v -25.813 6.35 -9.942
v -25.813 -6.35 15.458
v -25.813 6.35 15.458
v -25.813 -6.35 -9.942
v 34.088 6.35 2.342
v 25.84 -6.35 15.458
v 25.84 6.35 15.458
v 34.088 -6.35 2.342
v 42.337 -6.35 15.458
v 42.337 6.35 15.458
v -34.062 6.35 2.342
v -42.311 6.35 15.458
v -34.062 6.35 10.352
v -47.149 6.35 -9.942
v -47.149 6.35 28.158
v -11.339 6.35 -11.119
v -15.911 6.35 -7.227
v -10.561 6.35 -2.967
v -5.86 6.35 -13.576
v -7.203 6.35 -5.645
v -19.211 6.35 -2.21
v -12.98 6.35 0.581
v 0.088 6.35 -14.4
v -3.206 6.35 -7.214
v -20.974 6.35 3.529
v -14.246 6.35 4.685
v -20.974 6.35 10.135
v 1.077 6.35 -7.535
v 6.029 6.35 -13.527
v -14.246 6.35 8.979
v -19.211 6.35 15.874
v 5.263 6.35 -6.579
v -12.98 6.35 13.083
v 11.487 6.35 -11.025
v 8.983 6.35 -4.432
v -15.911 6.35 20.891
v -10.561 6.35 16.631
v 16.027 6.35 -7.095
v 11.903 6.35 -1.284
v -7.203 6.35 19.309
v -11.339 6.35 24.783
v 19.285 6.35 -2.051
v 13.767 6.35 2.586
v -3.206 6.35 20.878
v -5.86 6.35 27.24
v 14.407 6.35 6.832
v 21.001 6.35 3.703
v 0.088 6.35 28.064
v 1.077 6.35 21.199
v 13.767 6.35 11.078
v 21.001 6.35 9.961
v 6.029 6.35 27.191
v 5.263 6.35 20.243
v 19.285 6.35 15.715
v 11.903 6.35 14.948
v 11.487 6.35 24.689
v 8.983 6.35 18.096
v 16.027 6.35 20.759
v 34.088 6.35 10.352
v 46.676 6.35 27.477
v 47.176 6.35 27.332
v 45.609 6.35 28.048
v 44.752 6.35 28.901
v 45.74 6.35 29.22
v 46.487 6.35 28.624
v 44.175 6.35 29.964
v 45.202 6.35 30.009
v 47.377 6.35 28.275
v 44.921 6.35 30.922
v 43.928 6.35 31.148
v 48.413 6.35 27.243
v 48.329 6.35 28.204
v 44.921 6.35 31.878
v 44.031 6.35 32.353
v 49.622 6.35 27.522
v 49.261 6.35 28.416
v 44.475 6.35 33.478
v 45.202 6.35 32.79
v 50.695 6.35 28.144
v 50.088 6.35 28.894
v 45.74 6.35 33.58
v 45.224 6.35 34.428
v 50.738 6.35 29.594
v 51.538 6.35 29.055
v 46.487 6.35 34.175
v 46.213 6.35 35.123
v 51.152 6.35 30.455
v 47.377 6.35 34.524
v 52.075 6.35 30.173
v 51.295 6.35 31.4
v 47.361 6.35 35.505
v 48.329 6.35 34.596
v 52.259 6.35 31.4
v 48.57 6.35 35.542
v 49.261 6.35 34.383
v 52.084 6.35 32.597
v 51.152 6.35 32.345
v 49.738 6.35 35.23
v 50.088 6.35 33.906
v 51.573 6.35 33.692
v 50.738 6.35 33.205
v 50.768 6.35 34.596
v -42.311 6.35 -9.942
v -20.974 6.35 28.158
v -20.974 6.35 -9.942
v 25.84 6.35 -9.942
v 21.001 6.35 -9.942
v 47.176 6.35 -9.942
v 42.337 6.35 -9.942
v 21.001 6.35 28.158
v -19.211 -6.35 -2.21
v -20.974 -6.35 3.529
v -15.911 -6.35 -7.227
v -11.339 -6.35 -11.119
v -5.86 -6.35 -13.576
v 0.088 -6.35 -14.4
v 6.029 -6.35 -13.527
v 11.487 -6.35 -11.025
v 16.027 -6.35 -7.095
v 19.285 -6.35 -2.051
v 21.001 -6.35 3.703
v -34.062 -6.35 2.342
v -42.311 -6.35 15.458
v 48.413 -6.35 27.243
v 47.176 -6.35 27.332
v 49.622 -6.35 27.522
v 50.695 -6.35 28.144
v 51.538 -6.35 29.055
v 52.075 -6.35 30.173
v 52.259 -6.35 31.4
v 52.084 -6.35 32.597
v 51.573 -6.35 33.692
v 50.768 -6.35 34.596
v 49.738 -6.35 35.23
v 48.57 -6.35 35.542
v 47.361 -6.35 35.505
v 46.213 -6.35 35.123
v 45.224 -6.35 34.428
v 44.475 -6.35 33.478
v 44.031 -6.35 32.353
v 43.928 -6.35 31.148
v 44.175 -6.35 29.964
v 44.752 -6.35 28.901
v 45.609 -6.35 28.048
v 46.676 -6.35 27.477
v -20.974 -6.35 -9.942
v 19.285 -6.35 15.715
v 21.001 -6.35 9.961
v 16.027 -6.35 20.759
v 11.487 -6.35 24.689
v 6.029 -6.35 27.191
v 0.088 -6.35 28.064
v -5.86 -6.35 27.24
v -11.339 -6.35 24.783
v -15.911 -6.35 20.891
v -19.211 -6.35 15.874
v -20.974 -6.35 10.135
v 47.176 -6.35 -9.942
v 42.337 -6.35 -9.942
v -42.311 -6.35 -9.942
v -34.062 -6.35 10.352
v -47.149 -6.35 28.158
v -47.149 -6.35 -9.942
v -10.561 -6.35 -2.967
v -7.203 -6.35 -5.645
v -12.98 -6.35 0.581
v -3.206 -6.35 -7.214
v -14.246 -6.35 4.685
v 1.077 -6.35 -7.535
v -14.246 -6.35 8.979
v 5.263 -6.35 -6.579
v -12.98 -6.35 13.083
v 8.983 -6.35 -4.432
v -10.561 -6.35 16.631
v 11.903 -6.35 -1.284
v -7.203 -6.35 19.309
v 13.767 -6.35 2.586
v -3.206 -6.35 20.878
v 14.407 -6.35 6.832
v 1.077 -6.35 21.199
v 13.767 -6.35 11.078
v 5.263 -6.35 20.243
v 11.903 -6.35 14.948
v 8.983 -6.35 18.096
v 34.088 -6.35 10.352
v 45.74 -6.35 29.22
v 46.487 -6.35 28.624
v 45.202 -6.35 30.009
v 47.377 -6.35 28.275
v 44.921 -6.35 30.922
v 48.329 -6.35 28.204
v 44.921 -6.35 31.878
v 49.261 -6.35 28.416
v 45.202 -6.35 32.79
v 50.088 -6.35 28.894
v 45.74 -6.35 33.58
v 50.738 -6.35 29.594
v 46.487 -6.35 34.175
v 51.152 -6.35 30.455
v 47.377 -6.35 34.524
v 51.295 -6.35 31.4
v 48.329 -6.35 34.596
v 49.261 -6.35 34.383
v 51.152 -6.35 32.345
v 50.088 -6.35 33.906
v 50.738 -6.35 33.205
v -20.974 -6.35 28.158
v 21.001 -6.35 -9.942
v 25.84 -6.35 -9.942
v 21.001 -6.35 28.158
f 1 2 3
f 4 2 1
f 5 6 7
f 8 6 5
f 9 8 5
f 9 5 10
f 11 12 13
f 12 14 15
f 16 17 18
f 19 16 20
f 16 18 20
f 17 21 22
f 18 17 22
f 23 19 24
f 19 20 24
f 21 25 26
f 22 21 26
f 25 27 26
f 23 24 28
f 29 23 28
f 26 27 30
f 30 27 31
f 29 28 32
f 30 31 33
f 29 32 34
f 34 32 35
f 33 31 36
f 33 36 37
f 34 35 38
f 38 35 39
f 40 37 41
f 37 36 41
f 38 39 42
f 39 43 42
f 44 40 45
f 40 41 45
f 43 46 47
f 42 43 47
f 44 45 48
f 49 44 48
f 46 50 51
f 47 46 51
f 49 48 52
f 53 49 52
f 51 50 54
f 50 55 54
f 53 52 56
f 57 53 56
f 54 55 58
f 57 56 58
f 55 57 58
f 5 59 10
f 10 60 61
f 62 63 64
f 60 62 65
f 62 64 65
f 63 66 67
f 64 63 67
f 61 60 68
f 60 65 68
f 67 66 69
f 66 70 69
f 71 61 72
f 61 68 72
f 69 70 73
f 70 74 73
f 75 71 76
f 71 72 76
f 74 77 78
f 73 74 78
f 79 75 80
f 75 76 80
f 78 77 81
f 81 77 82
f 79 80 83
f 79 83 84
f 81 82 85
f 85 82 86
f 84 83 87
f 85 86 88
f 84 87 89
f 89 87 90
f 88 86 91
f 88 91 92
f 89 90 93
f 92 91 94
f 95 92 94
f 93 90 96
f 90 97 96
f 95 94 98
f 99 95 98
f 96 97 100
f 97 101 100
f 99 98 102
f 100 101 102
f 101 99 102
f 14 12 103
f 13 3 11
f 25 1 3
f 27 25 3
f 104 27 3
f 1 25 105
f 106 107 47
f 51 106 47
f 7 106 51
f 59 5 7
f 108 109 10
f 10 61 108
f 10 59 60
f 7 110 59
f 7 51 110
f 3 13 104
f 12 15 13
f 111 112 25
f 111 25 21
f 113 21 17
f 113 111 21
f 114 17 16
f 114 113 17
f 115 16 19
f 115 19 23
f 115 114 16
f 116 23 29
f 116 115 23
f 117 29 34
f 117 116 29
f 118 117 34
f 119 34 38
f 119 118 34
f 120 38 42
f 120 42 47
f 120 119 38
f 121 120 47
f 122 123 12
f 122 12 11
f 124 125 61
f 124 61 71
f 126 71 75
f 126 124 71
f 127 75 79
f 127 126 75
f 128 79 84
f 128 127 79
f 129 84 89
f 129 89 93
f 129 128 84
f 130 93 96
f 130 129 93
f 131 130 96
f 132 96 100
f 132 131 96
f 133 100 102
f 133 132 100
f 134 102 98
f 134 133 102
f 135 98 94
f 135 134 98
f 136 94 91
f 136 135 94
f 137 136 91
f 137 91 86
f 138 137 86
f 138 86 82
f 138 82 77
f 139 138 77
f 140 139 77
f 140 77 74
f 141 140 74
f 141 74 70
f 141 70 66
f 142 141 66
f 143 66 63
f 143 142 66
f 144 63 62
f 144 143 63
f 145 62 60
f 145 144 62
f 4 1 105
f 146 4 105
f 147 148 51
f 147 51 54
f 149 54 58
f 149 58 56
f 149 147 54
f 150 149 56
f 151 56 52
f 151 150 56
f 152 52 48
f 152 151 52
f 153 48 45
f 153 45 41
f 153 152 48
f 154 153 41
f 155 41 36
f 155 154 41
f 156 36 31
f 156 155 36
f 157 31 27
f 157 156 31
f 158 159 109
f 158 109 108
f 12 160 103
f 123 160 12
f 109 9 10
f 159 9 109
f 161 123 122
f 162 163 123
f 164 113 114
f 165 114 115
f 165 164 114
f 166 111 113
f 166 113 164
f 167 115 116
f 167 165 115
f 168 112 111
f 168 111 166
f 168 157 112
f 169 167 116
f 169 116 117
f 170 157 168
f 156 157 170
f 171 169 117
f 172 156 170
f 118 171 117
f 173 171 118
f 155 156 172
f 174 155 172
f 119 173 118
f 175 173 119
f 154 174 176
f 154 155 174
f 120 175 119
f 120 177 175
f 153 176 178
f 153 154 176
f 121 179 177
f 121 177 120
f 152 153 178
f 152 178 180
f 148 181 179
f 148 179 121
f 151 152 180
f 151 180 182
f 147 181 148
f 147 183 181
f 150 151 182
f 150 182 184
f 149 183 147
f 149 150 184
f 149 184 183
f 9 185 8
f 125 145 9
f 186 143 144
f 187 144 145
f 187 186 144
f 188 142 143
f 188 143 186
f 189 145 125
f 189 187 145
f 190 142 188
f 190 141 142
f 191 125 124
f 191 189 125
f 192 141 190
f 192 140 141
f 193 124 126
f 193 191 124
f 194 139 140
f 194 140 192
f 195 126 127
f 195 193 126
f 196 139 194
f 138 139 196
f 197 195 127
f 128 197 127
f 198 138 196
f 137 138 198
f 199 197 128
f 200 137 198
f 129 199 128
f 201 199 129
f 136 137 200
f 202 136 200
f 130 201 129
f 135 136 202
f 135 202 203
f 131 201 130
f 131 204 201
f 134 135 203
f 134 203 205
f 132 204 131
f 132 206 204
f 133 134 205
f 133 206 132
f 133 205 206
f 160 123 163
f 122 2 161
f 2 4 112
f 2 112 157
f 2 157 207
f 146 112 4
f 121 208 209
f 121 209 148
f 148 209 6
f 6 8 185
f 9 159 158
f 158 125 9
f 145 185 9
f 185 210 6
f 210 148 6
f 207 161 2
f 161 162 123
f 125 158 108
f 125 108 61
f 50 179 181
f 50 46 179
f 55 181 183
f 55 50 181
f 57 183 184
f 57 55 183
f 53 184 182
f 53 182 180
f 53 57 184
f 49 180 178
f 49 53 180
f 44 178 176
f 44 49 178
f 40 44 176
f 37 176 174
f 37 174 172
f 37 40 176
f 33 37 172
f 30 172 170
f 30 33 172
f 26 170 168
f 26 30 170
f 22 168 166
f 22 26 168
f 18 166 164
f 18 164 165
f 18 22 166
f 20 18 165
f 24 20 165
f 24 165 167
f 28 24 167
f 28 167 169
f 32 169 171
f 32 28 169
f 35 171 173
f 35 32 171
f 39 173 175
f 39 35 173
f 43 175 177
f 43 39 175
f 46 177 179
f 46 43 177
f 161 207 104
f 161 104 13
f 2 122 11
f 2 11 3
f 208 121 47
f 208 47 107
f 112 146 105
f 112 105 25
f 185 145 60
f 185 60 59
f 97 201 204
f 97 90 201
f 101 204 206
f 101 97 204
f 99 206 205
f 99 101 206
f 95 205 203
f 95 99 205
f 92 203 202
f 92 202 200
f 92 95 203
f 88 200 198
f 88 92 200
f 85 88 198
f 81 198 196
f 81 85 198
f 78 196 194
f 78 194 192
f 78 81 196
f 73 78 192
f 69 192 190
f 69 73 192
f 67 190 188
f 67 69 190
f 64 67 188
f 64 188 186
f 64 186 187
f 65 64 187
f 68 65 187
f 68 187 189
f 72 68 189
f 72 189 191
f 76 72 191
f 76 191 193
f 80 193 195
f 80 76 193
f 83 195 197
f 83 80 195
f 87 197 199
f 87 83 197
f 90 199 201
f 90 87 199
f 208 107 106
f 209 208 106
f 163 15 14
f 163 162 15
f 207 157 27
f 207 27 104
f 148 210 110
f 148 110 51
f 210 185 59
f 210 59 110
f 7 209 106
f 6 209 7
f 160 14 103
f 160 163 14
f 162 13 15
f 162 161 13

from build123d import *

# Parameters (mm, degrees)
F0_R     = 14.4068230009
F0_R_2   = 3.2049597944
F1_DEPTH = 6.35


with BuildPart() as f1:
    # F0 (on Front) → F1 (new body, symmetric)
    with BuildSketch(Plane.XZ):
        with BuildLine():
            Line((-47.1492125925, -9.9419855554), (-42.3105131817, -9.9419855554))
            Line((-42.3105131817, -9.9419855554), (-42.3105131817, 15.4580144446))
            Line((-42.3105131817, 15.4580144446), (-34.0617353508, 2.3423101061))
            Line((-34.0617353508, 2.3423101061), (-25.8129575198, 15.4580144446))
            Line((-25.8129575198, 15.4580144446), (-25.8129575198, -9.9419855554))
            Line((-25.8129575198, -9.9419855554), (-20.974258109, -9.9419855554))
            Line((-20.974258109, -9.9419855554), (-20.974258109, 3.529483276))
            ThreePointArc((-20.974258109, 3.529483276), (-21.2326654511, 6.8319942802), (-20.974258109, 10.1345052844))
            Line((-20.974258109, 10.1345052844), (-20.974258109, 28.1580144446))
            Line((-20.974258109, 28.1580144446), (-34.0617353508, 10.3524101739))
            Line((-34.0617353508, 10.3524101739), (-47.1492125925, 28.1580144446))
            Line((-47.1492125925, 28.1580144446), (-47.1492125925, -9.9419855554))
        make_face()
        with BuildLine():
            ThreePointArc((21.0008528084, 9.9609339535), (0.0877984695, 28.0644782043), (-20.974258109, 10.1345052844))
            Line((-20.974258109, 10.1345052844), (-20.974258109, 3.529483276))
            ThreePointArc((-20.974258109, 3.529483276), (0.0877984695, -14.4004896439), (21.0008528084, 3.703054607))
            Line((21.0008528084, 3.703054607), (21.0008528084, 9.9609339535))
        make_face()
        with Locations((0, 6.8319942802)):
            Circle(F0_R, mode=Mode.SUBTRACT)
        with BuildLine():
            Line((-20.974258109, 3.529483276), (-20.974258109, 10.1345052844))
            ThreePointArc((-20.974258109, 10.1345052844), (-21.2326654511, 6.8319942802), (-20.974258109, 3.529483276))
        make_face()
        with BuildLine():
            Line((21.0008528084, 28.1580144446), (21.0008528084, 9.9609339535))
            ThreePointArc((21.0008528084, 9.9609339535), (21.1746329841, 8.4007517966), (21.2326654511, 6.8319942802))
            ThreePointArc((21.2326654511, 6.8319942802), (21.1746329841, 5.2632367639), (21.0008528084, 3.703054607))
            Line((21.0008528084, 3.703054607), (21.0008528084, -9.9419855554))
            Line((21.0008528084, -9.9419855554), (25.8395522192, -9.9419855554))
            Line((25.8395522192, -9.9419855554), (25.8395522192, 15.4580144446))
            Line((25.8395522192, 15.4580144446), (34.0883300501, 2.3423101061))
            Line((34.0883300501, 2.3423101061), (42.3371078811, 15.4580144446))
            Line((42.3371078811, 15.4580144446), (42.3371078811, -9.9419855554))
            Line((42.3371078811, -9.9419855554), (47.1758072919, -9.9419855554))
            Line((47.1758072919, -9.9419855554), (47.1758072919, 27.3316462631))
            ThreePointArc((47.1758072919, 27.3316462631), (46.923397405, 27.3967035148), (46.6755457316, 27.477405095))
            Line((46.6755457316, 27.477405095), (34.0883300501, 10.3524101739))
            Line((34.0883300501, 10.3524101739), (21.0008528084, 28.1580144446))
        make_face()
        with BuildLine():
            ThreePointArc((21.2326654511, 6.8319942802), (21.1746329841, 8.4007517966), (21.0008528084, 9.9609339535))
            Line((21.0008528084, 9.9609339535), (21.0008528084, 3.703054607))
            ThreePointArc((21.0008528084, 3.703054607), (21.1746329841, 5.2632367639), (21.2326654511, 6.8319942802))
        make_face()
        with BuildLine():
            ThreePointArc((52.2593864205, 31.3998535275), (45.6930221637, 34.8117766856), (46.6755457316, 27.477405095))
            Line((46.6755457316, 27.477405095), (47.1758072919, 28.1580144446))
            Line((47.1758072919, 28.1580144446), (47.1758072919, 27.3316462631))
            ThreePointArc((47.1758072919, 27.3316462631), (50.6950358132, 28.144354829), (52.2593864205, 31.3998535275))
        make_face()
        with Locations((48.0897761881, 31.3998535275)):
            Circle(F0_R_2, mode=Mode.SUBTRACT)
        with BuildLine():
            Line((47.1758072919, 28.1580144446), (46.6755457316, 27.477405095))
            ThreePointArc((46.6755457316, 27.477405095), (46.923397405, 27.3967035148), (47.1758072919, 27.3316462631))
            Line((47.1758072919, 27.3316462631), (47.1758072919, 28.1580144446))
        make_face()
    extrude(amount=F1_DEPTH, both=True)


solid = f1.part
